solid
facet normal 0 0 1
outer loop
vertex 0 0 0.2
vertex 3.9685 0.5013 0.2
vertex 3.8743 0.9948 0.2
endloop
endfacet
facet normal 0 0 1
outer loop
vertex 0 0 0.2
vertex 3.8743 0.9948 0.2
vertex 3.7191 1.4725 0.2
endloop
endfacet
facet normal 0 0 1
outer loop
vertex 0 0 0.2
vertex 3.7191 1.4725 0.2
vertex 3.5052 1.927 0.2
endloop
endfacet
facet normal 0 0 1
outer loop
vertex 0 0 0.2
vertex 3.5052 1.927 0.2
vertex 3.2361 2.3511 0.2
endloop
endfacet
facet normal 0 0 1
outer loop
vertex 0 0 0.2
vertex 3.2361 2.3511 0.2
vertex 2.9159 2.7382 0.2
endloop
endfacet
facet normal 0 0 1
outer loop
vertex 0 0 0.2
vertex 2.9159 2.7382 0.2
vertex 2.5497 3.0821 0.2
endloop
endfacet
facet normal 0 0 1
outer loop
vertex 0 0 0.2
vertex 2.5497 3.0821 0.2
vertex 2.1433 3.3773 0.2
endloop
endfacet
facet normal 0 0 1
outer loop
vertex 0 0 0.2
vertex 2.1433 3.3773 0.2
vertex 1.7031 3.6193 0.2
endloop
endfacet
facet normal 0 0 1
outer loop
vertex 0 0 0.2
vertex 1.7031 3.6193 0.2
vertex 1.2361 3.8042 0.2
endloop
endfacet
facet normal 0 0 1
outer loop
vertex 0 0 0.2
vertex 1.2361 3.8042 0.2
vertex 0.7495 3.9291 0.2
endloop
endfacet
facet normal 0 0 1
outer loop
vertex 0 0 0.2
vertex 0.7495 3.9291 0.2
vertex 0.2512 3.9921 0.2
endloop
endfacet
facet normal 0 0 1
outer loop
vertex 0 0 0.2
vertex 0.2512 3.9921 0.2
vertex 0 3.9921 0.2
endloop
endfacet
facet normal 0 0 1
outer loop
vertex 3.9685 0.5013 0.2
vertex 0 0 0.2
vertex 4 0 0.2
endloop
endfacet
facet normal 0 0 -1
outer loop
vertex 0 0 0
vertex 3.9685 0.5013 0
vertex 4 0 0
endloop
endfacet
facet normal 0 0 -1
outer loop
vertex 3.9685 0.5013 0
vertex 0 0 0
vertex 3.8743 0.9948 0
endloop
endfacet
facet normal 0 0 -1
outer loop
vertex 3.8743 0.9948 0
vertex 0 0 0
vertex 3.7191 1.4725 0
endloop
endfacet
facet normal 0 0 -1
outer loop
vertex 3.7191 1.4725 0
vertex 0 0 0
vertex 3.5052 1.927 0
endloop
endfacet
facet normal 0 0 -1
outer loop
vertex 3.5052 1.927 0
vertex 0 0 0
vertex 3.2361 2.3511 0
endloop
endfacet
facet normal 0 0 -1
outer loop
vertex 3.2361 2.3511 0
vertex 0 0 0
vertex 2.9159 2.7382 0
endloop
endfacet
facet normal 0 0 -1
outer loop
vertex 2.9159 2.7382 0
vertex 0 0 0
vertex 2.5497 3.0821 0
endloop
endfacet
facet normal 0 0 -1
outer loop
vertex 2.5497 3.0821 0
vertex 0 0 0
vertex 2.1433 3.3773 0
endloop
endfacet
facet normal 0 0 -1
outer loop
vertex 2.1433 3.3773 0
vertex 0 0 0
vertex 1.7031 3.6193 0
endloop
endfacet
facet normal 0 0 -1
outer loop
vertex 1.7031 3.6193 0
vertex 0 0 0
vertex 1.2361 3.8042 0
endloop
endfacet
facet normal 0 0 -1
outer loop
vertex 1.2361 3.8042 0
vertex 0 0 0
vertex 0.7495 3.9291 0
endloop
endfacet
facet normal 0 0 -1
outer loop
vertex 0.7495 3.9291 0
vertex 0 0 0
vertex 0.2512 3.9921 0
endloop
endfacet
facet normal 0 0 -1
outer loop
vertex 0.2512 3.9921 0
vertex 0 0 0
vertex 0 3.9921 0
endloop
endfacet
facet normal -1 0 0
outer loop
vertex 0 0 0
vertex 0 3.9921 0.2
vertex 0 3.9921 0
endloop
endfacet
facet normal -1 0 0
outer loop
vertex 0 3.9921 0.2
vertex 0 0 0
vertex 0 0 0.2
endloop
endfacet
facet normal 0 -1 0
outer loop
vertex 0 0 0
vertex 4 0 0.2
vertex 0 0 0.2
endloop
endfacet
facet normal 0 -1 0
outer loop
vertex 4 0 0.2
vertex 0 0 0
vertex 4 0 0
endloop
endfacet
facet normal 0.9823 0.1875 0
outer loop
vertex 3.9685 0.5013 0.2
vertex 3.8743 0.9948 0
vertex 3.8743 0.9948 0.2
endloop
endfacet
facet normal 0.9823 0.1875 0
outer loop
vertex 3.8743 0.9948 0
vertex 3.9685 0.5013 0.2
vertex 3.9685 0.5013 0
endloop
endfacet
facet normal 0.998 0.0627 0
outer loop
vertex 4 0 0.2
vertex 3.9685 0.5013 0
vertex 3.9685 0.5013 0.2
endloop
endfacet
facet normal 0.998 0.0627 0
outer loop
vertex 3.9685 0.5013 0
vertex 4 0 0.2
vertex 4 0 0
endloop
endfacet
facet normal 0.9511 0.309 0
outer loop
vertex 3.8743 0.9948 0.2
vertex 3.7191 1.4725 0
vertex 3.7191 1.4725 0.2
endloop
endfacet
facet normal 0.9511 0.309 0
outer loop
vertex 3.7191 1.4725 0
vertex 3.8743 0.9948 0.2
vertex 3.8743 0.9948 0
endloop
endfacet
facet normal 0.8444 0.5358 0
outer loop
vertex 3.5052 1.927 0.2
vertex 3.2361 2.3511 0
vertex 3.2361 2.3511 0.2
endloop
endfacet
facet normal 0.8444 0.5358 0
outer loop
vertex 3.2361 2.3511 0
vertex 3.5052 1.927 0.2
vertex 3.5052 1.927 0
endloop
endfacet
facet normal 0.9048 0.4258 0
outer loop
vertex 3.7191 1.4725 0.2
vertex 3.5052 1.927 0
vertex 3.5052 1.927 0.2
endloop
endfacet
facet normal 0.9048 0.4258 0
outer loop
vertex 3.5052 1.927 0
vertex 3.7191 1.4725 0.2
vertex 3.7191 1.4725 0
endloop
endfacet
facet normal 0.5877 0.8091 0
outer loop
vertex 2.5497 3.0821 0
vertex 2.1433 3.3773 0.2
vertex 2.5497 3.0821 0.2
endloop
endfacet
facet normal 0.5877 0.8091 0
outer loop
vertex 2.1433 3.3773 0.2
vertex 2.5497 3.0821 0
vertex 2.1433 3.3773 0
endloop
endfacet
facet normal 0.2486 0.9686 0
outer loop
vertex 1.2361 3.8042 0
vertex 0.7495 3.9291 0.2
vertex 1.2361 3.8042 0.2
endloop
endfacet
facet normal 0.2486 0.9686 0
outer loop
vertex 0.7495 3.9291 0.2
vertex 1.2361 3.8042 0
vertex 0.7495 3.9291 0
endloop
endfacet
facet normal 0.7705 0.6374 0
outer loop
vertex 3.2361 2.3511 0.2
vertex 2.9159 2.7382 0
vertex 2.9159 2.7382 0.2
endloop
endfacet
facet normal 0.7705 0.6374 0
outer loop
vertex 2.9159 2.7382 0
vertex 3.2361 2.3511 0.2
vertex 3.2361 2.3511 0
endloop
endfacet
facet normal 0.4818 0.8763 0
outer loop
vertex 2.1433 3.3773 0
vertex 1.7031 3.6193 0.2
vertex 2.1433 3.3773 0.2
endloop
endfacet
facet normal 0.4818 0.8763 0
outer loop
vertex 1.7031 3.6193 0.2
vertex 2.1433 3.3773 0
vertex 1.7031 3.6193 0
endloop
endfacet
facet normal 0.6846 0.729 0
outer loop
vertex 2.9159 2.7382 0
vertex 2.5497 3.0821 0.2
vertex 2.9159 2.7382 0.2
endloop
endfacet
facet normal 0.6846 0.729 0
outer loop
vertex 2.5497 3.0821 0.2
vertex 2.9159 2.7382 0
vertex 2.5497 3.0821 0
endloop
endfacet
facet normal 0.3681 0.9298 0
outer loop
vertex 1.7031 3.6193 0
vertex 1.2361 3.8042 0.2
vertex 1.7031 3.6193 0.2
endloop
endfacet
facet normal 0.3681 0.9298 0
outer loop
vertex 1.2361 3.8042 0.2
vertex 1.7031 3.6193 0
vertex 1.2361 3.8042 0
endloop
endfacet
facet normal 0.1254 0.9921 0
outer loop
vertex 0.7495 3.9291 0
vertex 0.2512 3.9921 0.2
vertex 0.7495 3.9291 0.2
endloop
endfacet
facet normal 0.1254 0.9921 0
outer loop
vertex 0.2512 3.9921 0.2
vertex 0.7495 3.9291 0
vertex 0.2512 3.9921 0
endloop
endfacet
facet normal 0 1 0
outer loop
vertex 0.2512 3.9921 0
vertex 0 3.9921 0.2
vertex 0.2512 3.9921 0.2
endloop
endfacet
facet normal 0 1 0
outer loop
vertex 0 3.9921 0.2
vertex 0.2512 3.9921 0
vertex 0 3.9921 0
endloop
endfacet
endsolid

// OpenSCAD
module Street_03(){

    intersection(){
        translate([0,0,0]){
        color("#3b4747")
        cube([8,8,0.2]);
        }

        translate([0,0,0])
        cylinder(4,4,4, $fn=50);

    }
}

Street_03();

// Written by Nicolì Angelo (Gengio) 2024: 
// MIT License

//Permission is hereby granted, free of charge, to any person obtaining a copy of this software and associated documentation files (the "Software"), to deal in the Software without restriction, including without limitation the rights to use, copy, modify, merge, publish, distribute, sublicense, and/or sell copies of the Software, and to permit persons to whom the Software is furnished to do so, subject to the following conditions:

//The above copyright notice and this permission notice shall be included in all copies or substantial portions of the Software.

//THE SOFTWARE IS PROVIDED "AS IS", WITHOUT WARRANTY OF ANY KIND, EXPRESS OR IMPLIED, INCLUDING BUT NOT LIMITED TO THE WARRANTIES OF MERCHANTABILITY, FITNESS FOR A PARTICULAR PURPOSE AND NONINFRINGEMENT. IN NO EVENT SHALL THE AUTHORS OR COPYRIGHT HOLDERS BE LIABLE FOR ANY CLAIM, DAMAGES OR OTHER LIABILITY, WHETHER IN AN ACTION OF CONTRACT, TORT OR OTHERWISE, ARISING FROM, OUT OF OR IN CONNECTION WITH THE SOFTWARE OR THE USE OR OTHER DEALINGS IN THE SOFTWARE.
